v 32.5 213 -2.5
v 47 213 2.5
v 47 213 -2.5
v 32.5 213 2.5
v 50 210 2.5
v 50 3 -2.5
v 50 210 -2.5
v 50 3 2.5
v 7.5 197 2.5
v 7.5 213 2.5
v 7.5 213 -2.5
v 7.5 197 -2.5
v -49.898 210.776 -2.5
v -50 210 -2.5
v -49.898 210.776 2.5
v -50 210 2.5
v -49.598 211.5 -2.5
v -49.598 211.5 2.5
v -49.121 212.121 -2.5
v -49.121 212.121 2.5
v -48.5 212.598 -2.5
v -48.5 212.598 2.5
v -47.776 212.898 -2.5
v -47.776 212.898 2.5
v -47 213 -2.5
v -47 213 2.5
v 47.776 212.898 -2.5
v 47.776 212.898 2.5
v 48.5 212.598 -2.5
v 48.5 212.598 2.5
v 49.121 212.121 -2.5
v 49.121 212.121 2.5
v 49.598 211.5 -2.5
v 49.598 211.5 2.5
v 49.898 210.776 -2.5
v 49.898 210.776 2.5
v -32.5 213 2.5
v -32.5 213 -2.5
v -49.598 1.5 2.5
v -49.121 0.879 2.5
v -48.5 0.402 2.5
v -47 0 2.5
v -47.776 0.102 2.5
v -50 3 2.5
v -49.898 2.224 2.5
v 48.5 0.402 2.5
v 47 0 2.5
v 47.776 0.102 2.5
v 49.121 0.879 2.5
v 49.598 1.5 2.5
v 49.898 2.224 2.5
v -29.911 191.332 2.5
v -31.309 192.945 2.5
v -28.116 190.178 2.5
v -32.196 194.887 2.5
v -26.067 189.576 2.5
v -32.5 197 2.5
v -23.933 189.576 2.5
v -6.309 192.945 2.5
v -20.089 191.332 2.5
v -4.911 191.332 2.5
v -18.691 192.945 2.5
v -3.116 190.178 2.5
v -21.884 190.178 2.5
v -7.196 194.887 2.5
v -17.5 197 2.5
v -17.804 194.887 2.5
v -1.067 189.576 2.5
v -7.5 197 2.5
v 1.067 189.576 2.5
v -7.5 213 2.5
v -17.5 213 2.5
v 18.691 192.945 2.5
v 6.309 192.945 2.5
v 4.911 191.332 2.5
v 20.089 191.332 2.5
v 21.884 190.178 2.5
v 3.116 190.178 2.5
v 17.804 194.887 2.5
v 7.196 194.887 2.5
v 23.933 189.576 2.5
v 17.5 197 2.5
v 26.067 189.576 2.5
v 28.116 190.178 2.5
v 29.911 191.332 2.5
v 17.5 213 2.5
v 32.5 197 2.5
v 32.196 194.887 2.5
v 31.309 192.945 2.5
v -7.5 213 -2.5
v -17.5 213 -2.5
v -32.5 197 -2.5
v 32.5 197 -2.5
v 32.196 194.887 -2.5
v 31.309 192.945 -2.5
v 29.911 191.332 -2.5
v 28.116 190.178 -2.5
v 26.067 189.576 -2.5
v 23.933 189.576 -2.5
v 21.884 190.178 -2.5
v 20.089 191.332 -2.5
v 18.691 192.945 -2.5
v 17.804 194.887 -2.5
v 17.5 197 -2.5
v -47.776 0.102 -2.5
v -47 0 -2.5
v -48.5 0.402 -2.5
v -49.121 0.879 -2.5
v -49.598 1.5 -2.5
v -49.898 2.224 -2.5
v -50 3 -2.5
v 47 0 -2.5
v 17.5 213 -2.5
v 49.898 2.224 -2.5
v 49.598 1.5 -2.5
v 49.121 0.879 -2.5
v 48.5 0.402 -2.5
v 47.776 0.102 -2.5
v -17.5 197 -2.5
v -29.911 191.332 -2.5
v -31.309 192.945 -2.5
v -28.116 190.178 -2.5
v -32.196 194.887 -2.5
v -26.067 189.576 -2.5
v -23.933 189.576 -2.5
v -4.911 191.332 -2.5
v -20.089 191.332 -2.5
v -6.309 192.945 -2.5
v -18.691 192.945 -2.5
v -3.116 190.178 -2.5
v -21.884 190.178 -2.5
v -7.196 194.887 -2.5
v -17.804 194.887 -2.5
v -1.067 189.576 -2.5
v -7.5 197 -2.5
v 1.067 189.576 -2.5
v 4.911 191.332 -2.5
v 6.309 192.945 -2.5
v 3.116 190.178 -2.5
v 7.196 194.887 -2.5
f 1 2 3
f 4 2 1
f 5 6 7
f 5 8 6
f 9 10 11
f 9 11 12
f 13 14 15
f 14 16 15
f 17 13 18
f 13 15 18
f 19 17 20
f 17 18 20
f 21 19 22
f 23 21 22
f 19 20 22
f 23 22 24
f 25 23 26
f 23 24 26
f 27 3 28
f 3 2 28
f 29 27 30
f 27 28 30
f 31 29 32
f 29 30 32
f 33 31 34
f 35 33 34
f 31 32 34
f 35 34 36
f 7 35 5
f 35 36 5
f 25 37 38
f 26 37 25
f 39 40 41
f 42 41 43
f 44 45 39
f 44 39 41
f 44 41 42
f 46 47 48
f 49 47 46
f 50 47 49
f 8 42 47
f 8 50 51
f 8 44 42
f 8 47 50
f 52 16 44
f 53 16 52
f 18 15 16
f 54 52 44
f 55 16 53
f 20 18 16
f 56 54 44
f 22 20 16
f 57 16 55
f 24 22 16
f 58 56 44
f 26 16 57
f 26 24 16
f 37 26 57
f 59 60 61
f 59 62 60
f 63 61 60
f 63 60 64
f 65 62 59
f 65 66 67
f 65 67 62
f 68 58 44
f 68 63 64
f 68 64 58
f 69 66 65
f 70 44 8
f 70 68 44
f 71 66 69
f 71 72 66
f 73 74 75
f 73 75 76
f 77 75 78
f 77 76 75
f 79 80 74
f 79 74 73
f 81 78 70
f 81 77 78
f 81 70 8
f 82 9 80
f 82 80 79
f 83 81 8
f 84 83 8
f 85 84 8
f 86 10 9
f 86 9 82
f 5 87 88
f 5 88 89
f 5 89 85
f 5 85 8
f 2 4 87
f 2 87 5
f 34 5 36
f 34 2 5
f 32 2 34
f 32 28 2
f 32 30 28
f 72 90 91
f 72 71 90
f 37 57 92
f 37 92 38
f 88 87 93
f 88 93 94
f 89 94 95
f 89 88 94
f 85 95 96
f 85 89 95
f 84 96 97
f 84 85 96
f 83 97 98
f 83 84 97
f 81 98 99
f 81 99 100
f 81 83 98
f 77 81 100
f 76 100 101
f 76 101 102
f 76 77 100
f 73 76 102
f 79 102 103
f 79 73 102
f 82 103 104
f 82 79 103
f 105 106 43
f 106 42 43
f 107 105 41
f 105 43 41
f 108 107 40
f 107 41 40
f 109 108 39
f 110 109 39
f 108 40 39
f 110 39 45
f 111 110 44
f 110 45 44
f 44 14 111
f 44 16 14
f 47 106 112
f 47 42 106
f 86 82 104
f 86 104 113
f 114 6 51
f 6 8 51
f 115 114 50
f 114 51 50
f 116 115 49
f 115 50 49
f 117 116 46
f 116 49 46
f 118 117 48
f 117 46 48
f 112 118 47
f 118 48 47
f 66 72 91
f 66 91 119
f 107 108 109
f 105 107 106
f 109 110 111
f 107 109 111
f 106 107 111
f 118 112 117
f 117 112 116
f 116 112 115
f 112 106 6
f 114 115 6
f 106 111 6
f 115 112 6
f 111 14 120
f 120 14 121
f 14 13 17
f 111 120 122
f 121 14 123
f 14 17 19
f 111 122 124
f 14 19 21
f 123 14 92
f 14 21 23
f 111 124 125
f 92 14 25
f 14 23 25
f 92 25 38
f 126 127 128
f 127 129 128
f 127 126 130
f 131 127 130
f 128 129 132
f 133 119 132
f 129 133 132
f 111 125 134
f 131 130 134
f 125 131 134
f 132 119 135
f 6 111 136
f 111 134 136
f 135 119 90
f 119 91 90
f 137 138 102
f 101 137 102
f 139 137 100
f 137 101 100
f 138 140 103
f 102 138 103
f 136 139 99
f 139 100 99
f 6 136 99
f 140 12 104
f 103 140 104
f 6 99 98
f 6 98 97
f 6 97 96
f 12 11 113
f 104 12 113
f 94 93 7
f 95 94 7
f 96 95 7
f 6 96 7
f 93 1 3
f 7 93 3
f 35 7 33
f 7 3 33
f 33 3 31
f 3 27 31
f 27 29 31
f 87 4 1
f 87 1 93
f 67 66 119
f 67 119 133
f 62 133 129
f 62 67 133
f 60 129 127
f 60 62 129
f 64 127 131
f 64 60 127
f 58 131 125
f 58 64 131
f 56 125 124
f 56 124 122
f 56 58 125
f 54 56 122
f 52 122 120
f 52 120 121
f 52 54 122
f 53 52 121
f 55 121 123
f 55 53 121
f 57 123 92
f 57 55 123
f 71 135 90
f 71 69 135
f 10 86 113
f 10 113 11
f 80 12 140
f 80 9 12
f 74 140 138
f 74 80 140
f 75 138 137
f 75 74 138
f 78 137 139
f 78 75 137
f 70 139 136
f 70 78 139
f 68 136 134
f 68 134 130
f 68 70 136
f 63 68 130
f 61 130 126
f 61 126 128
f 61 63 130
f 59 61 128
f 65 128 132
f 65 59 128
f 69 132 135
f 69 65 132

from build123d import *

# Parameters (mm, degrees)
BOSS_EXTRUDE1_DEPTH = 2.5
FILLET1_R           = 3


with BuildPart() as part:
    # Sketch1 → Boss-Extrude1 (new body, symmetric)
    with BuildSketch(Plane.XY):
        with BuildLine():
            Line((-7.5, 213), (-17.5, 213))
            Line((-17.5, 213), (-17.5, 197))
            ThreePointArc((-17.5, 197), (-25, 189.5), (-32.5, 197))
            Line((-32.5, 197), (-32.5, 213))
            Line((-32.5, 213), (-50, 213))
            Line((-50, 213), (-50, 0))
            Line((-50, 0), (50, 0))
            Line((50, 0), (50, 213))
            Line((50, 213), (32.5, 213))
            Line((32.5, 213), (32.5, 197))
            ThreePointArc((32.5, 197), (25, 189.5), (17.5, 197))
            Line((17.5, 197), (17.5, 213))
            Line((17.5, 213), (7.5, 213))
            Line((7.5, 213), (7.5, 197))
            ThreePointArc((7.5, 197), (0, 189.5), (-7.5, 197))
            Line((-7.5, 197), (-7.5, 213))
        make_face()
    extrude(amount=BOSS_EXTRUDE1_DEPTH, both=True)

    # Fillet1
    fillet1_edges = [part.edges().sort_by_distance(p)[0] for p in [
        (50, 213, 0),
        (50, 0, 0),
        (-50, 0, 0),
        (-50, 213, 0),
    ]]
    fillet(fillet1_edges, radius=FILLET1_R)


solid = part.part
